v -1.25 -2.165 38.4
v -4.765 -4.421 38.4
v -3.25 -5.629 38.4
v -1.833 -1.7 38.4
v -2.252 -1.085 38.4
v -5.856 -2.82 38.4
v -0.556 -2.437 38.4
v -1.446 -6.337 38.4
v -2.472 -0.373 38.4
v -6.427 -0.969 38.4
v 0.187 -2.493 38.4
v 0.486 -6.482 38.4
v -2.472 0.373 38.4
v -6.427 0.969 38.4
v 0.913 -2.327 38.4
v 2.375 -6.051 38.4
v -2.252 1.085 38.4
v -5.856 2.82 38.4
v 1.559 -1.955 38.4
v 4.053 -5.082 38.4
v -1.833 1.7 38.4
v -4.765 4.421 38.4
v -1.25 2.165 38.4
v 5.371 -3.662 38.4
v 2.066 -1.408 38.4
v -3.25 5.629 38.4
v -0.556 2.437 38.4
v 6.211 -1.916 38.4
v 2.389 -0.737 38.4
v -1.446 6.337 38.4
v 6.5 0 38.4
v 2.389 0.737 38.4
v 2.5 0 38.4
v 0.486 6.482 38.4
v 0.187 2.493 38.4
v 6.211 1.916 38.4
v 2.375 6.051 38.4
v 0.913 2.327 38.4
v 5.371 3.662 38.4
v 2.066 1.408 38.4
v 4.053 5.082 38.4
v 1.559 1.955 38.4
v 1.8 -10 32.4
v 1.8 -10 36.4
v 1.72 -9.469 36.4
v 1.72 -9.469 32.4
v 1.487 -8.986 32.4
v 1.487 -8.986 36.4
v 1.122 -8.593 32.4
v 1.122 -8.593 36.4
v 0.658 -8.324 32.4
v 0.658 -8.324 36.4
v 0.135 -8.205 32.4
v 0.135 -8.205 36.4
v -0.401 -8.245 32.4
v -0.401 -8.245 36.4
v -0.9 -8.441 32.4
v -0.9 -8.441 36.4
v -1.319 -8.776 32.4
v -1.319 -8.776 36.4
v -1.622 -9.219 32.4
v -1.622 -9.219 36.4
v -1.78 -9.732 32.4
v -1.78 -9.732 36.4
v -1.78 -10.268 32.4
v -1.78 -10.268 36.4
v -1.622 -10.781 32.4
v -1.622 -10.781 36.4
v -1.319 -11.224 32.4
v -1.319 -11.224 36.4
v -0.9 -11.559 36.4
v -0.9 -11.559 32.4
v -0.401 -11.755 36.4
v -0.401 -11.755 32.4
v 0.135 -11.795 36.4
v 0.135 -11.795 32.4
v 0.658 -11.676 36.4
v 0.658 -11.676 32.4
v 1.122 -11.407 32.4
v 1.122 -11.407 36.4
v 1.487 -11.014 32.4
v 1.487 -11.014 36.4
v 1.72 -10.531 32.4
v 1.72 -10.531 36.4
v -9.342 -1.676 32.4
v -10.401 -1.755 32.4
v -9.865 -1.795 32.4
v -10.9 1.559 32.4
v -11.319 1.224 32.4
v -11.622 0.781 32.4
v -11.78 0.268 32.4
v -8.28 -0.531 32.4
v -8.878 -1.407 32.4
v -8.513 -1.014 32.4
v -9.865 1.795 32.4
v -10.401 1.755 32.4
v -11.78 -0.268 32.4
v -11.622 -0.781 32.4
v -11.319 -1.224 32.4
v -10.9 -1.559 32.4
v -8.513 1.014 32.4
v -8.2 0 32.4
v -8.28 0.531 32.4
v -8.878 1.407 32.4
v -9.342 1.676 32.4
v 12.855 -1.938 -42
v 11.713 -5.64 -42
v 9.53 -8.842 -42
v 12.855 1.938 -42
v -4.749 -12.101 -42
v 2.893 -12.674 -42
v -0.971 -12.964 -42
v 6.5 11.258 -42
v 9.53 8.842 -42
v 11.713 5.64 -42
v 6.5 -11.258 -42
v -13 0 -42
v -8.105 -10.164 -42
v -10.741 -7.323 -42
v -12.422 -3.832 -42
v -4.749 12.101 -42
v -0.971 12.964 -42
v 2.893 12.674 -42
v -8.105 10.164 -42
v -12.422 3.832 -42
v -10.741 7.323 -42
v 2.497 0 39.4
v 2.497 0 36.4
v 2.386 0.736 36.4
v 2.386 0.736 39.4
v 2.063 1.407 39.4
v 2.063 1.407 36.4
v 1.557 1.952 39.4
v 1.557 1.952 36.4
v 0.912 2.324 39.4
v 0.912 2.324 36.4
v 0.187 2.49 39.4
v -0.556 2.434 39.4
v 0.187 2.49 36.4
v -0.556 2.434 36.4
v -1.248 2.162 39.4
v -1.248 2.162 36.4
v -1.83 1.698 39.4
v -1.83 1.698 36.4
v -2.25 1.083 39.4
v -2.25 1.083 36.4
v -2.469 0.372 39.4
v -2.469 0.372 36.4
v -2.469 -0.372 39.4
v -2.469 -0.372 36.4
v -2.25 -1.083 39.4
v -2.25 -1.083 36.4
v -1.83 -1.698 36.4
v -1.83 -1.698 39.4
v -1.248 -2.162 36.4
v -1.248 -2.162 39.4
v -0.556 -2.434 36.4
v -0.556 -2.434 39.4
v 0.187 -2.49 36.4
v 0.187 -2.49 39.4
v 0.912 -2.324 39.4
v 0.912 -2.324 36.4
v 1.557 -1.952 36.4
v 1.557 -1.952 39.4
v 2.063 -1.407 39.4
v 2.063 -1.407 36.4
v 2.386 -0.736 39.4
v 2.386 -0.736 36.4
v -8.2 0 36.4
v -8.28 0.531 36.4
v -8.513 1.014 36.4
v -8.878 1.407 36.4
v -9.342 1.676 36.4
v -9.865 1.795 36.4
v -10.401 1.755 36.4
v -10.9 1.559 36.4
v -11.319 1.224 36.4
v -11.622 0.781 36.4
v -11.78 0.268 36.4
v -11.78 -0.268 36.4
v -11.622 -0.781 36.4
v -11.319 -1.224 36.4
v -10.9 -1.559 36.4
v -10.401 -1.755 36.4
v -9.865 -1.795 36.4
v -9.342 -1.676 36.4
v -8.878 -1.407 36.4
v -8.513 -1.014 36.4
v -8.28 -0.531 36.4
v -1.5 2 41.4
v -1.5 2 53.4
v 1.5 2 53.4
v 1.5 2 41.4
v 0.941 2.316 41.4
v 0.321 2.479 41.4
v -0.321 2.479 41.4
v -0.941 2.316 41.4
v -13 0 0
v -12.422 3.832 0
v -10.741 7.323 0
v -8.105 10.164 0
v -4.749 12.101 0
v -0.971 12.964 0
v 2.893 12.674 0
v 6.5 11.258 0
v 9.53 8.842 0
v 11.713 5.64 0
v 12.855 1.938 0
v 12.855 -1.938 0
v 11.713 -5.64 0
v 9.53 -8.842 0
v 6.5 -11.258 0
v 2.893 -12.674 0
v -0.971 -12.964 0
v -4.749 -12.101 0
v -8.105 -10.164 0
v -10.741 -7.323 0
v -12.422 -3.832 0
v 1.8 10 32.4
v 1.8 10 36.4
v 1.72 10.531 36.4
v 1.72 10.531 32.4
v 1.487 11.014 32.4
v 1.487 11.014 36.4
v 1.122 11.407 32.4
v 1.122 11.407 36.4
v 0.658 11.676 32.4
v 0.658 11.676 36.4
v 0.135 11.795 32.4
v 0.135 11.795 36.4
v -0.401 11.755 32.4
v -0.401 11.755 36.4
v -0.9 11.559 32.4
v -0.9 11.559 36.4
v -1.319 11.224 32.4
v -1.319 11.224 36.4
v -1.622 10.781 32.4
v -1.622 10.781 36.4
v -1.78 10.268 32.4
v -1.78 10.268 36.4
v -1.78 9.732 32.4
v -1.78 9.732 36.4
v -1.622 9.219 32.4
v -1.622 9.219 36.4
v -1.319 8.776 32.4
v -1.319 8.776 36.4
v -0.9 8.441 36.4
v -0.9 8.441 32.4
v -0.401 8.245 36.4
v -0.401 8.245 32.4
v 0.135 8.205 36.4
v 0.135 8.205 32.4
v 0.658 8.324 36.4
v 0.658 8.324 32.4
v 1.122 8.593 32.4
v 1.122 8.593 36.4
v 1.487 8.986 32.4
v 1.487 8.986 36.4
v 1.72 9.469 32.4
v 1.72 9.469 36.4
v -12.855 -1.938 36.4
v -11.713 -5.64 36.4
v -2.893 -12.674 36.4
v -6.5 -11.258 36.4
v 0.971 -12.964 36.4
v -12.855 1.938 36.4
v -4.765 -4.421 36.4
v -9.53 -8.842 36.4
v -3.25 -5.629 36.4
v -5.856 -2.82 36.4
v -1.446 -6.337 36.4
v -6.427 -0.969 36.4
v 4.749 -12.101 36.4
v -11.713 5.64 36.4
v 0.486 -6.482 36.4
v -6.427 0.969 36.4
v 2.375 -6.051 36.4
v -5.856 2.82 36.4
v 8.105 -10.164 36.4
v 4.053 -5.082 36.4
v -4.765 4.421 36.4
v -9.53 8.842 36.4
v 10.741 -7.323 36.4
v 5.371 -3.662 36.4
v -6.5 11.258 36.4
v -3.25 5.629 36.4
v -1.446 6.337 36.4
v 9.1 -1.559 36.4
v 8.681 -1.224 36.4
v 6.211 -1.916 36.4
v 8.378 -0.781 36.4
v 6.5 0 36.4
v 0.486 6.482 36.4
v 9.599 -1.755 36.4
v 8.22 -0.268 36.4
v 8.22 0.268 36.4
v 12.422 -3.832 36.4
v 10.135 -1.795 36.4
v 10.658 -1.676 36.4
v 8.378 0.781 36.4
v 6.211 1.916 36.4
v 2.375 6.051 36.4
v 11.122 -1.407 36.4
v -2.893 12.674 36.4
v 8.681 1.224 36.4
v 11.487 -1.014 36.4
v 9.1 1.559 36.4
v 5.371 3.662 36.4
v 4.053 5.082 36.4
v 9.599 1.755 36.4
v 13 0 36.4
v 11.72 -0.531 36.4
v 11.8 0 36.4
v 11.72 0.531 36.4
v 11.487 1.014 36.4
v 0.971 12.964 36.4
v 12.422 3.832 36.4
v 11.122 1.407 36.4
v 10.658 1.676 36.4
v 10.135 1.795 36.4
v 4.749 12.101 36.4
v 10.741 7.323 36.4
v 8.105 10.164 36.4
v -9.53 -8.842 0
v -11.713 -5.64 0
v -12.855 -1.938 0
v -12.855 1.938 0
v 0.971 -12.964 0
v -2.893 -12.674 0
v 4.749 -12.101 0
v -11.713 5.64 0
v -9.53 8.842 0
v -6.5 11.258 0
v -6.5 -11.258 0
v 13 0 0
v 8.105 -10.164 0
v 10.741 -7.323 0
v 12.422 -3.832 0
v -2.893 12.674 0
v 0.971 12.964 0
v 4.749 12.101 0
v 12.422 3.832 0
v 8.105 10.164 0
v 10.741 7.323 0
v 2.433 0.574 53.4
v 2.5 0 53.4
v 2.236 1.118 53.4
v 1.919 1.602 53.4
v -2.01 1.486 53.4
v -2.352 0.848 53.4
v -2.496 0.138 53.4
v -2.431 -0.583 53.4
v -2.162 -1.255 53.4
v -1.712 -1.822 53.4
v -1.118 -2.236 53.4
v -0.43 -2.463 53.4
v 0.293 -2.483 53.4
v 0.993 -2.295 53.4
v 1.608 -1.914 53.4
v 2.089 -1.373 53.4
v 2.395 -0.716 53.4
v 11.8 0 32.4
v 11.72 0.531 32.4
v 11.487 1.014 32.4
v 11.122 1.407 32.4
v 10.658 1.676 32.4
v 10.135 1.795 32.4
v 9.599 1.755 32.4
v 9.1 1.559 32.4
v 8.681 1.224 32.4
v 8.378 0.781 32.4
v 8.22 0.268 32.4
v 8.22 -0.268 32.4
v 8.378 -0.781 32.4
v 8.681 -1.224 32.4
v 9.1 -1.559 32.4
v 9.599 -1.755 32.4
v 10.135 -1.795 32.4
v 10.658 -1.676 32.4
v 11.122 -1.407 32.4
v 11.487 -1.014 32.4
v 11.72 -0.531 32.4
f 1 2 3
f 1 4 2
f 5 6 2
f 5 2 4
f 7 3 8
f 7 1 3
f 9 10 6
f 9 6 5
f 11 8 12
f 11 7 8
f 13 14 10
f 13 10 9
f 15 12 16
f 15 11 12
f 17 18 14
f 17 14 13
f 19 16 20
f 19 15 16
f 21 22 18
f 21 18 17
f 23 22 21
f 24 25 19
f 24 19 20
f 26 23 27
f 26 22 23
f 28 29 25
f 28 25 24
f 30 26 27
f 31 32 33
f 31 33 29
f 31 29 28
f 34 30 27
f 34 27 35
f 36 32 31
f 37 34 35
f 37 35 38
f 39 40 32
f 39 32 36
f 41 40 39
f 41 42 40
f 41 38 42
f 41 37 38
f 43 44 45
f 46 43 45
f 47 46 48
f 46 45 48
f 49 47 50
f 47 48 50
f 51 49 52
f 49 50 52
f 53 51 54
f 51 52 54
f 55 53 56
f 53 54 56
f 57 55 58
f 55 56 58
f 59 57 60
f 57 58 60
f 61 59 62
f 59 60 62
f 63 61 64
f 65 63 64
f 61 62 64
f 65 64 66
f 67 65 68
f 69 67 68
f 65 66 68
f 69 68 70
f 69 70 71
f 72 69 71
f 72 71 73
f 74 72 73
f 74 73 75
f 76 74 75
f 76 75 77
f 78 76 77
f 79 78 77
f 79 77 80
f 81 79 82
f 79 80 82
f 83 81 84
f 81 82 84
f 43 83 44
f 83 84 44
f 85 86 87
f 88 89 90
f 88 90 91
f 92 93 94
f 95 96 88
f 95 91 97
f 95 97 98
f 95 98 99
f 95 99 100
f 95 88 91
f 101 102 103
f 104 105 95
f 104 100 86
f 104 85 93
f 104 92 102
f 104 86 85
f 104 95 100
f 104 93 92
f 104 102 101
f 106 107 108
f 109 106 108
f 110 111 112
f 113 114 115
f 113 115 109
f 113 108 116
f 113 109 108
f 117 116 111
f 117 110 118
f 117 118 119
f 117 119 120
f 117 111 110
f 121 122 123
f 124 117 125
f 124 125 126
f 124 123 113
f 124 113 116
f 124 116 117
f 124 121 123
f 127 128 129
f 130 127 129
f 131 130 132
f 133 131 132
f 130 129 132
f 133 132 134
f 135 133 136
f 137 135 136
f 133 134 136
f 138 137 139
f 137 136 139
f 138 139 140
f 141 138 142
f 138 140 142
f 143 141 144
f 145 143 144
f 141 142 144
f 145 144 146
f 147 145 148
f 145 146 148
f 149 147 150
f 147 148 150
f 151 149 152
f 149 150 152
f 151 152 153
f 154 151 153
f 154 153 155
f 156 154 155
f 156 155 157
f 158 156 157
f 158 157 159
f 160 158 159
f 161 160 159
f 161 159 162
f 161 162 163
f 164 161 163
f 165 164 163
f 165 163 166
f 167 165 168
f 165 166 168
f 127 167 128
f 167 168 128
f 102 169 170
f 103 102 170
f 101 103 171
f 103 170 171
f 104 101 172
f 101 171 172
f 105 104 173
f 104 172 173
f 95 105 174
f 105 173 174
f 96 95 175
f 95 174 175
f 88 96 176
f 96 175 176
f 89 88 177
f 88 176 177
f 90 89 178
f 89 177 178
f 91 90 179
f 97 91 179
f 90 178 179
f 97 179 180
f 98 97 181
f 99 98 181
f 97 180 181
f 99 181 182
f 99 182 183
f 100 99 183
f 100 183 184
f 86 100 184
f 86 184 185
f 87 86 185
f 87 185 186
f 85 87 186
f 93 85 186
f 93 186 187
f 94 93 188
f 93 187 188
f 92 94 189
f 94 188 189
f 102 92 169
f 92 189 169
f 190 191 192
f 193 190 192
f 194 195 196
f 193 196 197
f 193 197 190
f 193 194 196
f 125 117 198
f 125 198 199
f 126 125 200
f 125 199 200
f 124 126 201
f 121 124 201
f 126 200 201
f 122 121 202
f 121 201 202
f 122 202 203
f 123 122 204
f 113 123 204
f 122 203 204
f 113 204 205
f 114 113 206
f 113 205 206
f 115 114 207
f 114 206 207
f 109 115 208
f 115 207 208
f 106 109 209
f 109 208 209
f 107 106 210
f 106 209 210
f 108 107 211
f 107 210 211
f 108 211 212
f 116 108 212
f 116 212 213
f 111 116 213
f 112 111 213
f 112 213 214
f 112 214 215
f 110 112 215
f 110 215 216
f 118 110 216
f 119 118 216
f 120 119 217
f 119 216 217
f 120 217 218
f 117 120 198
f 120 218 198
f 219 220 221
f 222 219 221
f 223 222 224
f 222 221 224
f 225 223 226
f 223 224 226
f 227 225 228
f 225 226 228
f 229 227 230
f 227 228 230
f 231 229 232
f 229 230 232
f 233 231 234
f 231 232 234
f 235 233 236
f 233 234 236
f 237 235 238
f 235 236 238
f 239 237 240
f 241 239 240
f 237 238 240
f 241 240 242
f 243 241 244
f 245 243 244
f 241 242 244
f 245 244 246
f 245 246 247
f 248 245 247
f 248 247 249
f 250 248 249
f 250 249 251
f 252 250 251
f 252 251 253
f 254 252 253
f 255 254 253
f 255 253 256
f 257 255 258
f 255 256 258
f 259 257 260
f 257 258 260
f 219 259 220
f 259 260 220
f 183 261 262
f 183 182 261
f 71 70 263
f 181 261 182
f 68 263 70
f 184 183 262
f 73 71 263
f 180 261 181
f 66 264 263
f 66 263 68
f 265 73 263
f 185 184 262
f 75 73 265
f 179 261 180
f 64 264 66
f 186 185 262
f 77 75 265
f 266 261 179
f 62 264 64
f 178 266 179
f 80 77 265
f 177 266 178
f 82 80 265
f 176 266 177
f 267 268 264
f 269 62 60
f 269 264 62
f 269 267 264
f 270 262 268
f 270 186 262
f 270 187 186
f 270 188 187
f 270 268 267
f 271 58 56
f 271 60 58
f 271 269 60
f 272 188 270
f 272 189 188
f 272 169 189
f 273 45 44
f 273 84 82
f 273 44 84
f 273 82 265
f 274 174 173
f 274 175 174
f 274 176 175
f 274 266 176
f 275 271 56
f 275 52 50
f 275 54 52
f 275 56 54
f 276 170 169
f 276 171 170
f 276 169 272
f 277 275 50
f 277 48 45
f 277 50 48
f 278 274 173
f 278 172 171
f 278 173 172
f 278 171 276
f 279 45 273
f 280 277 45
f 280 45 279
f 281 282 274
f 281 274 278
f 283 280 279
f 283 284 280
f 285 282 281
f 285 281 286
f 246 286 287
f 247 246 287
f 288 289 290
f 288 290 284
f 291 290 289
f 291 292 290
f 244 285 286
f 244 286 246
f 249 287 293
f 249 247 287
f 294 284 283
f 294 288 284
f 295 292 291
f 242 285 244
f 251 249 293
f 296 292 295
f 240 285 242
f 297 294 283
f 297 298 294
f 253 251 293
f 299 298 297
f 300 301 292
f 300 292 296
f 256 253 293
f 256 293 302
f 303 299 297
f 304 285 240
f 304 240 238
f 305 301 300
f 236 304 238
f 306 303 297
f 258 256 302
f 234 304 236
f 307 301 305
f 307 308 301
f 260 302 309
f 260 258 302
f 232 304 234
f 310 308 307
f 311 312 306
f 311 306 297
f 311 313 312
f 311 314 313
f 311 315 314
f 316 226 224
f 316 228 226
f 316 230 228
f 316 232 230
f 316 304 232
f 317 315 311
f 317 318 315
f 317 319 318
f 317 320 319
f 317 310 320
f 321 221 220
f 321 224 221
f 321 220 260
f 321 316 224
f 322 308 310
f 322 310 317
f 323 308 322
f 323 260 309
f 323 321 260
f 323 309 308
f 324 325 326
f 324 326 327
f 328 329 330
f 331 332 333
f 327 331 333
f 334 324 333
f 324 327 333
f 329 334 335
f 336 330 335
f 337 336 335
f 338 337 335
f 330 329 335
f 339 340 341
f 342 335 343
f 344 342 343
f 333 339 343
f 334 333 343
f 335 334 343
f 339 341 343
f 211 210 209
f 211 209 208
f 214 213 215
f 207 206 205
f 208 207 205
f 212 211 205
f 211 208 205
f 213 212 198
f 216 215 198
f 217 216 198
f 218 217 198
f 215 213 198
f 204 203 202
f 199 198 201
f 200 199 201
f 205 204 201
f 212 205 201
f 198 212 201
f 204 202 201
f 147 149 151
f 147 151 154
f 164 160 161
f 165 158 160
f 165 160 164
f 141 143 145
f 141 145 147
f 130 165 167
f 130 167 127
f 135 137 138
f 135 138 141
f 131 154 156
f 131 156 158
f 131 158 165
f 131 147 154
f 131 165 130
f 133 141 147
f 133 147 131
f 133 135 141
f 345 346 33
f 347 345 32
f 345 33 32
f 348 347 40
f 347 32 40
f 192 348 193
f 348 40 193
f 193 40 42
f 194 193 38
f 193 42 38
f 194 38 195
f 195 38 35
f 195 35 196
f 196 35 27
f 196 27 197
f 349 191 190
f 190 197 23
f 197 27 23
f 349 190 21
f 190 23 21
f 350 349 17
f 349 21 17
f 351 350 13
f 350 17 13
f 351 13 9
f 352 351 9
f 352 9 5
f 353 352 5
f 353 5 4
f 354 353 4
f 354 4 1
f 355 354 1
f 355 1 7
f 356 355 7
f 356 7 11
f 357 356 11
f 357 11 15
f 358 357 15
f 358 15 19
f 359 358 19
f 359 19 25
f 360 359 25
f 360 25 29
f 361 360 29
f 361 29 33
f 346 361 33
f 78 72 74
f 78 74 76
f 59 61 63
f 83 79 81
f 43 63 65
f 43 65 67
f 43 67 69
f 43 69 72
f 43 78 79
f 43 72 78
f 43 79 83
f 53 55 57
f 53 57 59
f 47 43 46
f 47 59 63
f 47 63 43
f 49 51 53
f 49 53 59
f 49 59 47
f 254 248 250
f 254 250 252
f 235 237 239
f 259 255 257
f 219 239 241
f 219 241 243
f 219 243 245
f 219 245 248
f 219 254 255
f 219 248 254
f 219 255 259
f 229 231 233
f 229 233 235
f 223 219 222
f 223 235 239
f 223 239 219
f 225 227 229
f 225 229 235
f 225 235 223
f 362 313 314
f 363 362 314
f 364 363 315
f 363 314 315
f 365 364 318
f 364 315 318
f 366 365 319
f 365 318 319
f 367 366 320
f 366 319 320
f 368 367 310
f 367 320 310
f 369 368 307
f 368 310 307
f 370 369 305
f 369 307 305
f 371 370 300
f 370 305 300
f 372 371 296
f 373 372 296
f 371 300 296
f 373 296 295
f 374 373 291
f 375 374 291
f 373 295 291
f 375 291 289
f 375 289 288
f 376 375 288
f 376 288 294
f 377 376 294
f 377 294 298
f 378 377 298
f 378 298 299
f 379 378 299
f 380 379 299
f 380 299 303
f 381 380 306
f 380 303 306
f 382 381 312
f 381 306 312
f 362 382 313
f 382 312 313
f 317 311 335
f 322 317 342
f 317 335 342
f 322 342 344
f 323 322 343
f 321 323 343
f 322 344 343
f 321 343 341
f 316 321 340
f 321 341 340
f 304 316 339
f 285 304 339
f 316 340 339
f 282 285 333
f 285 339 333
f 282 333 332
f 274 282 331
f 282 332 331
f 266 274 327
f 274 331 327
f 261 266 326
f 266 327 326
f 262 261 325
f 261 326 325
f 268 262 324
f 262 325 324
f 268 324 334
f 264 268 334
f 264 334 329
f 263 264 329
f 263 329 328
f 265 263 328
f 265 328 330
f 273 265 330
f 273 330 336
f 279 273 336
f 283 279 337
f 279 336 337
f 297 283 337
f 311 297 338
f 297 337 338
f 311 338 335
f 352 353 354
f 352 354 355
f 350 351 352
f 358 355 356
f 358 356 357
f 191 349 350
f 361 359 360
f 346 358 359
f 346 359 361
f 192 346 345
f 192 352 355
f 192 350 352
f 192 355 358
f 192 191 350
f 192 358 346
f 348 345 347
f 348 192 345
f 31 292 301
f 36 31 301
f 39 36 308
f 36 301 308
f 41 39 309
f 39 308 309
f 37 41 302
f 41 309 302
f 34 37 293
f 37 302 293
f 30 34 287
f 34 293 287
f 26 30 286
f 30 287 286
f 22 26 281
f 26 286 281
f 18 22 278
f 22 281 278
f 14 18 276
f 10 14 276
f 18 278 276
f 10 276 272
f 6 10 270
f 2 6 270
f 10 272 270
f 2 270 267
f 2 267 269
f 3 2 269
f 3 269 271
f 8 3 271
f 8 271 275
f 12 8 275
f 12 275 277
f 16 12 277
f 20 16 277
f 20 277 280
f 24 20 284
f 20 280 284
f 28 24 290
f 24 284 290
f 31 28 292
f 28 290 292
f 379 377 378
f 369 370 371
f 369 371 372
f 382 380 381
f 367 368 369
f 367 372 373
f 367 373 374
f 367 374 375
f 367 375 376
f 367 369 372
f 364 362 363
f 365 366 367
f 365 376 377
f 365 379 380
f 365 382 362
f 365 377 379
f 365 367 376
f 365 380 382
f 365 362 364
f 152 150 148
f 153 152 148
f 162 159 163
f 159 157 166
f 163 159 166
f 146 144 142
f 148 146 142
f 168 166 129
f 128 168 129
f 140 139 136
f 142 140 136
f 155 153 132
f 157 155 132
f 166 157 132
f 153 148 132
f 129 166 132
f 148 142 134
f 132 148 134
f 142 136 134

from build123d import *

# Parameters (mm, degrees)
ESQUISSE1_R                = 13
BOSS_EXTRU_REDUCTEUR_DEPTH = 36.4
ESQUISSE2_R                = 2.5
BOSS_EXTRU_ARBRE_DEPTH     = 17
ESQUISSE4_R                = 6.5
ESQUISSE4_R_2              = 2.5
BOSS_EXTRU_3_DEPTH         = 2
ESQUISSE5_R                = 1.8
ENL_V_MAT_EXTRU_2_DEPTH    = 4
ENL_V_MAT_EXTRU_3_DEPTH    = 12
ESQUISSE7_R                = 2.496805343
BOSS_EXTRU_4_DEPTH         = 3
ESQUISSE9_R                = 13
BOSS_EXTRU_5_DEPTH         = 42


with BuildPart() as part:
    # Esquisse1 → Boss.-Extru. Reducteur (new body)
    with BuildSketch(Plane.XY):
        Circle(ESQUISSE1_R)
    extrude(amount=BOSS_EXTRU_REDUCTEUR_DEPTH)

    # Esquisse2 → Boss.-Extru. Arbre (add)
    with BuildSketch(Plane.XY.offset(36.4)):
        Circle(ESQUISSE2_R)
    extrude(amount=BOSS_EXTRU_ARBRE_DEPTH)

    # Esquisse4 → Boss.-Extru.3 (add)
    with BuildSketch(Plane.XY.offset(36.4)):
        Circle(ESQUISSE4_R)
        Circle(ESQUISSE4_R_2, mode=Mode.SUBTRACT)
    extrude(amount=BOSS_EXTRU_3_DEPTH)

    # Esquisse5 → Enlèv. mat.-Extru.2 (cut)
    with BuildSketch(Plane.XY.offset(36.4)):
        with Locations((0, 10)):
            Circle(ESQUISSE5_R)
        with Locations((-10, 0)):
            Circle(ESQUISSE5_R)
        with Locations((0, -10)):
            Circle(ESQUISSE5_R)
        with Locations((10, 0)):
            Circle(ESQUISSE5_R)
    extrude(amount=-ENL_V_MAT_EXTRU_2_DEPTH, mode=Mode.SUBTRACT)

    # Esquisse6 → Enlèv. mat.-Extru.3 (cut)
    with BuildSketch(Plane.XY.offset(53.4)):
        with BuildLine():
            Line((0, 2), (1.5, 2))
            ThreePointArc((1.5, 2), (0, 2.5), (-1.5, 2))
            Line((-1.5, 2), (0, 2))
        make_face()
    extrude(amount=-ENL_V_MAT_EXTRU_3_DEPTH, mode=Mode.SUBTRACT)


with BuildPart() as body_2:
    # Esquisse7 → Boss.-Extru.4 (new body)
    with BuildSketch(Plane.XY.offset(36.4)):
        Circle(ESQUISSE7_R)
    extrude(amount=BOSS_EXTRU_4_DEPTH)


with BuildPart() as body_3:
    # Esquisse9 → Boss.-Extru.5 (new body)
    with BuildSketch(Plane(origin=(0, 0, 0), x_dir=(-1, 0, 0), z_dir=(0, 0, -1))):
        Circle(ESQUISSE9_R)
    extrude(amount=BOSS_EXTRU_5_DEPTH)


solid = Compound([part.part, body_2.part, body_3.part])
